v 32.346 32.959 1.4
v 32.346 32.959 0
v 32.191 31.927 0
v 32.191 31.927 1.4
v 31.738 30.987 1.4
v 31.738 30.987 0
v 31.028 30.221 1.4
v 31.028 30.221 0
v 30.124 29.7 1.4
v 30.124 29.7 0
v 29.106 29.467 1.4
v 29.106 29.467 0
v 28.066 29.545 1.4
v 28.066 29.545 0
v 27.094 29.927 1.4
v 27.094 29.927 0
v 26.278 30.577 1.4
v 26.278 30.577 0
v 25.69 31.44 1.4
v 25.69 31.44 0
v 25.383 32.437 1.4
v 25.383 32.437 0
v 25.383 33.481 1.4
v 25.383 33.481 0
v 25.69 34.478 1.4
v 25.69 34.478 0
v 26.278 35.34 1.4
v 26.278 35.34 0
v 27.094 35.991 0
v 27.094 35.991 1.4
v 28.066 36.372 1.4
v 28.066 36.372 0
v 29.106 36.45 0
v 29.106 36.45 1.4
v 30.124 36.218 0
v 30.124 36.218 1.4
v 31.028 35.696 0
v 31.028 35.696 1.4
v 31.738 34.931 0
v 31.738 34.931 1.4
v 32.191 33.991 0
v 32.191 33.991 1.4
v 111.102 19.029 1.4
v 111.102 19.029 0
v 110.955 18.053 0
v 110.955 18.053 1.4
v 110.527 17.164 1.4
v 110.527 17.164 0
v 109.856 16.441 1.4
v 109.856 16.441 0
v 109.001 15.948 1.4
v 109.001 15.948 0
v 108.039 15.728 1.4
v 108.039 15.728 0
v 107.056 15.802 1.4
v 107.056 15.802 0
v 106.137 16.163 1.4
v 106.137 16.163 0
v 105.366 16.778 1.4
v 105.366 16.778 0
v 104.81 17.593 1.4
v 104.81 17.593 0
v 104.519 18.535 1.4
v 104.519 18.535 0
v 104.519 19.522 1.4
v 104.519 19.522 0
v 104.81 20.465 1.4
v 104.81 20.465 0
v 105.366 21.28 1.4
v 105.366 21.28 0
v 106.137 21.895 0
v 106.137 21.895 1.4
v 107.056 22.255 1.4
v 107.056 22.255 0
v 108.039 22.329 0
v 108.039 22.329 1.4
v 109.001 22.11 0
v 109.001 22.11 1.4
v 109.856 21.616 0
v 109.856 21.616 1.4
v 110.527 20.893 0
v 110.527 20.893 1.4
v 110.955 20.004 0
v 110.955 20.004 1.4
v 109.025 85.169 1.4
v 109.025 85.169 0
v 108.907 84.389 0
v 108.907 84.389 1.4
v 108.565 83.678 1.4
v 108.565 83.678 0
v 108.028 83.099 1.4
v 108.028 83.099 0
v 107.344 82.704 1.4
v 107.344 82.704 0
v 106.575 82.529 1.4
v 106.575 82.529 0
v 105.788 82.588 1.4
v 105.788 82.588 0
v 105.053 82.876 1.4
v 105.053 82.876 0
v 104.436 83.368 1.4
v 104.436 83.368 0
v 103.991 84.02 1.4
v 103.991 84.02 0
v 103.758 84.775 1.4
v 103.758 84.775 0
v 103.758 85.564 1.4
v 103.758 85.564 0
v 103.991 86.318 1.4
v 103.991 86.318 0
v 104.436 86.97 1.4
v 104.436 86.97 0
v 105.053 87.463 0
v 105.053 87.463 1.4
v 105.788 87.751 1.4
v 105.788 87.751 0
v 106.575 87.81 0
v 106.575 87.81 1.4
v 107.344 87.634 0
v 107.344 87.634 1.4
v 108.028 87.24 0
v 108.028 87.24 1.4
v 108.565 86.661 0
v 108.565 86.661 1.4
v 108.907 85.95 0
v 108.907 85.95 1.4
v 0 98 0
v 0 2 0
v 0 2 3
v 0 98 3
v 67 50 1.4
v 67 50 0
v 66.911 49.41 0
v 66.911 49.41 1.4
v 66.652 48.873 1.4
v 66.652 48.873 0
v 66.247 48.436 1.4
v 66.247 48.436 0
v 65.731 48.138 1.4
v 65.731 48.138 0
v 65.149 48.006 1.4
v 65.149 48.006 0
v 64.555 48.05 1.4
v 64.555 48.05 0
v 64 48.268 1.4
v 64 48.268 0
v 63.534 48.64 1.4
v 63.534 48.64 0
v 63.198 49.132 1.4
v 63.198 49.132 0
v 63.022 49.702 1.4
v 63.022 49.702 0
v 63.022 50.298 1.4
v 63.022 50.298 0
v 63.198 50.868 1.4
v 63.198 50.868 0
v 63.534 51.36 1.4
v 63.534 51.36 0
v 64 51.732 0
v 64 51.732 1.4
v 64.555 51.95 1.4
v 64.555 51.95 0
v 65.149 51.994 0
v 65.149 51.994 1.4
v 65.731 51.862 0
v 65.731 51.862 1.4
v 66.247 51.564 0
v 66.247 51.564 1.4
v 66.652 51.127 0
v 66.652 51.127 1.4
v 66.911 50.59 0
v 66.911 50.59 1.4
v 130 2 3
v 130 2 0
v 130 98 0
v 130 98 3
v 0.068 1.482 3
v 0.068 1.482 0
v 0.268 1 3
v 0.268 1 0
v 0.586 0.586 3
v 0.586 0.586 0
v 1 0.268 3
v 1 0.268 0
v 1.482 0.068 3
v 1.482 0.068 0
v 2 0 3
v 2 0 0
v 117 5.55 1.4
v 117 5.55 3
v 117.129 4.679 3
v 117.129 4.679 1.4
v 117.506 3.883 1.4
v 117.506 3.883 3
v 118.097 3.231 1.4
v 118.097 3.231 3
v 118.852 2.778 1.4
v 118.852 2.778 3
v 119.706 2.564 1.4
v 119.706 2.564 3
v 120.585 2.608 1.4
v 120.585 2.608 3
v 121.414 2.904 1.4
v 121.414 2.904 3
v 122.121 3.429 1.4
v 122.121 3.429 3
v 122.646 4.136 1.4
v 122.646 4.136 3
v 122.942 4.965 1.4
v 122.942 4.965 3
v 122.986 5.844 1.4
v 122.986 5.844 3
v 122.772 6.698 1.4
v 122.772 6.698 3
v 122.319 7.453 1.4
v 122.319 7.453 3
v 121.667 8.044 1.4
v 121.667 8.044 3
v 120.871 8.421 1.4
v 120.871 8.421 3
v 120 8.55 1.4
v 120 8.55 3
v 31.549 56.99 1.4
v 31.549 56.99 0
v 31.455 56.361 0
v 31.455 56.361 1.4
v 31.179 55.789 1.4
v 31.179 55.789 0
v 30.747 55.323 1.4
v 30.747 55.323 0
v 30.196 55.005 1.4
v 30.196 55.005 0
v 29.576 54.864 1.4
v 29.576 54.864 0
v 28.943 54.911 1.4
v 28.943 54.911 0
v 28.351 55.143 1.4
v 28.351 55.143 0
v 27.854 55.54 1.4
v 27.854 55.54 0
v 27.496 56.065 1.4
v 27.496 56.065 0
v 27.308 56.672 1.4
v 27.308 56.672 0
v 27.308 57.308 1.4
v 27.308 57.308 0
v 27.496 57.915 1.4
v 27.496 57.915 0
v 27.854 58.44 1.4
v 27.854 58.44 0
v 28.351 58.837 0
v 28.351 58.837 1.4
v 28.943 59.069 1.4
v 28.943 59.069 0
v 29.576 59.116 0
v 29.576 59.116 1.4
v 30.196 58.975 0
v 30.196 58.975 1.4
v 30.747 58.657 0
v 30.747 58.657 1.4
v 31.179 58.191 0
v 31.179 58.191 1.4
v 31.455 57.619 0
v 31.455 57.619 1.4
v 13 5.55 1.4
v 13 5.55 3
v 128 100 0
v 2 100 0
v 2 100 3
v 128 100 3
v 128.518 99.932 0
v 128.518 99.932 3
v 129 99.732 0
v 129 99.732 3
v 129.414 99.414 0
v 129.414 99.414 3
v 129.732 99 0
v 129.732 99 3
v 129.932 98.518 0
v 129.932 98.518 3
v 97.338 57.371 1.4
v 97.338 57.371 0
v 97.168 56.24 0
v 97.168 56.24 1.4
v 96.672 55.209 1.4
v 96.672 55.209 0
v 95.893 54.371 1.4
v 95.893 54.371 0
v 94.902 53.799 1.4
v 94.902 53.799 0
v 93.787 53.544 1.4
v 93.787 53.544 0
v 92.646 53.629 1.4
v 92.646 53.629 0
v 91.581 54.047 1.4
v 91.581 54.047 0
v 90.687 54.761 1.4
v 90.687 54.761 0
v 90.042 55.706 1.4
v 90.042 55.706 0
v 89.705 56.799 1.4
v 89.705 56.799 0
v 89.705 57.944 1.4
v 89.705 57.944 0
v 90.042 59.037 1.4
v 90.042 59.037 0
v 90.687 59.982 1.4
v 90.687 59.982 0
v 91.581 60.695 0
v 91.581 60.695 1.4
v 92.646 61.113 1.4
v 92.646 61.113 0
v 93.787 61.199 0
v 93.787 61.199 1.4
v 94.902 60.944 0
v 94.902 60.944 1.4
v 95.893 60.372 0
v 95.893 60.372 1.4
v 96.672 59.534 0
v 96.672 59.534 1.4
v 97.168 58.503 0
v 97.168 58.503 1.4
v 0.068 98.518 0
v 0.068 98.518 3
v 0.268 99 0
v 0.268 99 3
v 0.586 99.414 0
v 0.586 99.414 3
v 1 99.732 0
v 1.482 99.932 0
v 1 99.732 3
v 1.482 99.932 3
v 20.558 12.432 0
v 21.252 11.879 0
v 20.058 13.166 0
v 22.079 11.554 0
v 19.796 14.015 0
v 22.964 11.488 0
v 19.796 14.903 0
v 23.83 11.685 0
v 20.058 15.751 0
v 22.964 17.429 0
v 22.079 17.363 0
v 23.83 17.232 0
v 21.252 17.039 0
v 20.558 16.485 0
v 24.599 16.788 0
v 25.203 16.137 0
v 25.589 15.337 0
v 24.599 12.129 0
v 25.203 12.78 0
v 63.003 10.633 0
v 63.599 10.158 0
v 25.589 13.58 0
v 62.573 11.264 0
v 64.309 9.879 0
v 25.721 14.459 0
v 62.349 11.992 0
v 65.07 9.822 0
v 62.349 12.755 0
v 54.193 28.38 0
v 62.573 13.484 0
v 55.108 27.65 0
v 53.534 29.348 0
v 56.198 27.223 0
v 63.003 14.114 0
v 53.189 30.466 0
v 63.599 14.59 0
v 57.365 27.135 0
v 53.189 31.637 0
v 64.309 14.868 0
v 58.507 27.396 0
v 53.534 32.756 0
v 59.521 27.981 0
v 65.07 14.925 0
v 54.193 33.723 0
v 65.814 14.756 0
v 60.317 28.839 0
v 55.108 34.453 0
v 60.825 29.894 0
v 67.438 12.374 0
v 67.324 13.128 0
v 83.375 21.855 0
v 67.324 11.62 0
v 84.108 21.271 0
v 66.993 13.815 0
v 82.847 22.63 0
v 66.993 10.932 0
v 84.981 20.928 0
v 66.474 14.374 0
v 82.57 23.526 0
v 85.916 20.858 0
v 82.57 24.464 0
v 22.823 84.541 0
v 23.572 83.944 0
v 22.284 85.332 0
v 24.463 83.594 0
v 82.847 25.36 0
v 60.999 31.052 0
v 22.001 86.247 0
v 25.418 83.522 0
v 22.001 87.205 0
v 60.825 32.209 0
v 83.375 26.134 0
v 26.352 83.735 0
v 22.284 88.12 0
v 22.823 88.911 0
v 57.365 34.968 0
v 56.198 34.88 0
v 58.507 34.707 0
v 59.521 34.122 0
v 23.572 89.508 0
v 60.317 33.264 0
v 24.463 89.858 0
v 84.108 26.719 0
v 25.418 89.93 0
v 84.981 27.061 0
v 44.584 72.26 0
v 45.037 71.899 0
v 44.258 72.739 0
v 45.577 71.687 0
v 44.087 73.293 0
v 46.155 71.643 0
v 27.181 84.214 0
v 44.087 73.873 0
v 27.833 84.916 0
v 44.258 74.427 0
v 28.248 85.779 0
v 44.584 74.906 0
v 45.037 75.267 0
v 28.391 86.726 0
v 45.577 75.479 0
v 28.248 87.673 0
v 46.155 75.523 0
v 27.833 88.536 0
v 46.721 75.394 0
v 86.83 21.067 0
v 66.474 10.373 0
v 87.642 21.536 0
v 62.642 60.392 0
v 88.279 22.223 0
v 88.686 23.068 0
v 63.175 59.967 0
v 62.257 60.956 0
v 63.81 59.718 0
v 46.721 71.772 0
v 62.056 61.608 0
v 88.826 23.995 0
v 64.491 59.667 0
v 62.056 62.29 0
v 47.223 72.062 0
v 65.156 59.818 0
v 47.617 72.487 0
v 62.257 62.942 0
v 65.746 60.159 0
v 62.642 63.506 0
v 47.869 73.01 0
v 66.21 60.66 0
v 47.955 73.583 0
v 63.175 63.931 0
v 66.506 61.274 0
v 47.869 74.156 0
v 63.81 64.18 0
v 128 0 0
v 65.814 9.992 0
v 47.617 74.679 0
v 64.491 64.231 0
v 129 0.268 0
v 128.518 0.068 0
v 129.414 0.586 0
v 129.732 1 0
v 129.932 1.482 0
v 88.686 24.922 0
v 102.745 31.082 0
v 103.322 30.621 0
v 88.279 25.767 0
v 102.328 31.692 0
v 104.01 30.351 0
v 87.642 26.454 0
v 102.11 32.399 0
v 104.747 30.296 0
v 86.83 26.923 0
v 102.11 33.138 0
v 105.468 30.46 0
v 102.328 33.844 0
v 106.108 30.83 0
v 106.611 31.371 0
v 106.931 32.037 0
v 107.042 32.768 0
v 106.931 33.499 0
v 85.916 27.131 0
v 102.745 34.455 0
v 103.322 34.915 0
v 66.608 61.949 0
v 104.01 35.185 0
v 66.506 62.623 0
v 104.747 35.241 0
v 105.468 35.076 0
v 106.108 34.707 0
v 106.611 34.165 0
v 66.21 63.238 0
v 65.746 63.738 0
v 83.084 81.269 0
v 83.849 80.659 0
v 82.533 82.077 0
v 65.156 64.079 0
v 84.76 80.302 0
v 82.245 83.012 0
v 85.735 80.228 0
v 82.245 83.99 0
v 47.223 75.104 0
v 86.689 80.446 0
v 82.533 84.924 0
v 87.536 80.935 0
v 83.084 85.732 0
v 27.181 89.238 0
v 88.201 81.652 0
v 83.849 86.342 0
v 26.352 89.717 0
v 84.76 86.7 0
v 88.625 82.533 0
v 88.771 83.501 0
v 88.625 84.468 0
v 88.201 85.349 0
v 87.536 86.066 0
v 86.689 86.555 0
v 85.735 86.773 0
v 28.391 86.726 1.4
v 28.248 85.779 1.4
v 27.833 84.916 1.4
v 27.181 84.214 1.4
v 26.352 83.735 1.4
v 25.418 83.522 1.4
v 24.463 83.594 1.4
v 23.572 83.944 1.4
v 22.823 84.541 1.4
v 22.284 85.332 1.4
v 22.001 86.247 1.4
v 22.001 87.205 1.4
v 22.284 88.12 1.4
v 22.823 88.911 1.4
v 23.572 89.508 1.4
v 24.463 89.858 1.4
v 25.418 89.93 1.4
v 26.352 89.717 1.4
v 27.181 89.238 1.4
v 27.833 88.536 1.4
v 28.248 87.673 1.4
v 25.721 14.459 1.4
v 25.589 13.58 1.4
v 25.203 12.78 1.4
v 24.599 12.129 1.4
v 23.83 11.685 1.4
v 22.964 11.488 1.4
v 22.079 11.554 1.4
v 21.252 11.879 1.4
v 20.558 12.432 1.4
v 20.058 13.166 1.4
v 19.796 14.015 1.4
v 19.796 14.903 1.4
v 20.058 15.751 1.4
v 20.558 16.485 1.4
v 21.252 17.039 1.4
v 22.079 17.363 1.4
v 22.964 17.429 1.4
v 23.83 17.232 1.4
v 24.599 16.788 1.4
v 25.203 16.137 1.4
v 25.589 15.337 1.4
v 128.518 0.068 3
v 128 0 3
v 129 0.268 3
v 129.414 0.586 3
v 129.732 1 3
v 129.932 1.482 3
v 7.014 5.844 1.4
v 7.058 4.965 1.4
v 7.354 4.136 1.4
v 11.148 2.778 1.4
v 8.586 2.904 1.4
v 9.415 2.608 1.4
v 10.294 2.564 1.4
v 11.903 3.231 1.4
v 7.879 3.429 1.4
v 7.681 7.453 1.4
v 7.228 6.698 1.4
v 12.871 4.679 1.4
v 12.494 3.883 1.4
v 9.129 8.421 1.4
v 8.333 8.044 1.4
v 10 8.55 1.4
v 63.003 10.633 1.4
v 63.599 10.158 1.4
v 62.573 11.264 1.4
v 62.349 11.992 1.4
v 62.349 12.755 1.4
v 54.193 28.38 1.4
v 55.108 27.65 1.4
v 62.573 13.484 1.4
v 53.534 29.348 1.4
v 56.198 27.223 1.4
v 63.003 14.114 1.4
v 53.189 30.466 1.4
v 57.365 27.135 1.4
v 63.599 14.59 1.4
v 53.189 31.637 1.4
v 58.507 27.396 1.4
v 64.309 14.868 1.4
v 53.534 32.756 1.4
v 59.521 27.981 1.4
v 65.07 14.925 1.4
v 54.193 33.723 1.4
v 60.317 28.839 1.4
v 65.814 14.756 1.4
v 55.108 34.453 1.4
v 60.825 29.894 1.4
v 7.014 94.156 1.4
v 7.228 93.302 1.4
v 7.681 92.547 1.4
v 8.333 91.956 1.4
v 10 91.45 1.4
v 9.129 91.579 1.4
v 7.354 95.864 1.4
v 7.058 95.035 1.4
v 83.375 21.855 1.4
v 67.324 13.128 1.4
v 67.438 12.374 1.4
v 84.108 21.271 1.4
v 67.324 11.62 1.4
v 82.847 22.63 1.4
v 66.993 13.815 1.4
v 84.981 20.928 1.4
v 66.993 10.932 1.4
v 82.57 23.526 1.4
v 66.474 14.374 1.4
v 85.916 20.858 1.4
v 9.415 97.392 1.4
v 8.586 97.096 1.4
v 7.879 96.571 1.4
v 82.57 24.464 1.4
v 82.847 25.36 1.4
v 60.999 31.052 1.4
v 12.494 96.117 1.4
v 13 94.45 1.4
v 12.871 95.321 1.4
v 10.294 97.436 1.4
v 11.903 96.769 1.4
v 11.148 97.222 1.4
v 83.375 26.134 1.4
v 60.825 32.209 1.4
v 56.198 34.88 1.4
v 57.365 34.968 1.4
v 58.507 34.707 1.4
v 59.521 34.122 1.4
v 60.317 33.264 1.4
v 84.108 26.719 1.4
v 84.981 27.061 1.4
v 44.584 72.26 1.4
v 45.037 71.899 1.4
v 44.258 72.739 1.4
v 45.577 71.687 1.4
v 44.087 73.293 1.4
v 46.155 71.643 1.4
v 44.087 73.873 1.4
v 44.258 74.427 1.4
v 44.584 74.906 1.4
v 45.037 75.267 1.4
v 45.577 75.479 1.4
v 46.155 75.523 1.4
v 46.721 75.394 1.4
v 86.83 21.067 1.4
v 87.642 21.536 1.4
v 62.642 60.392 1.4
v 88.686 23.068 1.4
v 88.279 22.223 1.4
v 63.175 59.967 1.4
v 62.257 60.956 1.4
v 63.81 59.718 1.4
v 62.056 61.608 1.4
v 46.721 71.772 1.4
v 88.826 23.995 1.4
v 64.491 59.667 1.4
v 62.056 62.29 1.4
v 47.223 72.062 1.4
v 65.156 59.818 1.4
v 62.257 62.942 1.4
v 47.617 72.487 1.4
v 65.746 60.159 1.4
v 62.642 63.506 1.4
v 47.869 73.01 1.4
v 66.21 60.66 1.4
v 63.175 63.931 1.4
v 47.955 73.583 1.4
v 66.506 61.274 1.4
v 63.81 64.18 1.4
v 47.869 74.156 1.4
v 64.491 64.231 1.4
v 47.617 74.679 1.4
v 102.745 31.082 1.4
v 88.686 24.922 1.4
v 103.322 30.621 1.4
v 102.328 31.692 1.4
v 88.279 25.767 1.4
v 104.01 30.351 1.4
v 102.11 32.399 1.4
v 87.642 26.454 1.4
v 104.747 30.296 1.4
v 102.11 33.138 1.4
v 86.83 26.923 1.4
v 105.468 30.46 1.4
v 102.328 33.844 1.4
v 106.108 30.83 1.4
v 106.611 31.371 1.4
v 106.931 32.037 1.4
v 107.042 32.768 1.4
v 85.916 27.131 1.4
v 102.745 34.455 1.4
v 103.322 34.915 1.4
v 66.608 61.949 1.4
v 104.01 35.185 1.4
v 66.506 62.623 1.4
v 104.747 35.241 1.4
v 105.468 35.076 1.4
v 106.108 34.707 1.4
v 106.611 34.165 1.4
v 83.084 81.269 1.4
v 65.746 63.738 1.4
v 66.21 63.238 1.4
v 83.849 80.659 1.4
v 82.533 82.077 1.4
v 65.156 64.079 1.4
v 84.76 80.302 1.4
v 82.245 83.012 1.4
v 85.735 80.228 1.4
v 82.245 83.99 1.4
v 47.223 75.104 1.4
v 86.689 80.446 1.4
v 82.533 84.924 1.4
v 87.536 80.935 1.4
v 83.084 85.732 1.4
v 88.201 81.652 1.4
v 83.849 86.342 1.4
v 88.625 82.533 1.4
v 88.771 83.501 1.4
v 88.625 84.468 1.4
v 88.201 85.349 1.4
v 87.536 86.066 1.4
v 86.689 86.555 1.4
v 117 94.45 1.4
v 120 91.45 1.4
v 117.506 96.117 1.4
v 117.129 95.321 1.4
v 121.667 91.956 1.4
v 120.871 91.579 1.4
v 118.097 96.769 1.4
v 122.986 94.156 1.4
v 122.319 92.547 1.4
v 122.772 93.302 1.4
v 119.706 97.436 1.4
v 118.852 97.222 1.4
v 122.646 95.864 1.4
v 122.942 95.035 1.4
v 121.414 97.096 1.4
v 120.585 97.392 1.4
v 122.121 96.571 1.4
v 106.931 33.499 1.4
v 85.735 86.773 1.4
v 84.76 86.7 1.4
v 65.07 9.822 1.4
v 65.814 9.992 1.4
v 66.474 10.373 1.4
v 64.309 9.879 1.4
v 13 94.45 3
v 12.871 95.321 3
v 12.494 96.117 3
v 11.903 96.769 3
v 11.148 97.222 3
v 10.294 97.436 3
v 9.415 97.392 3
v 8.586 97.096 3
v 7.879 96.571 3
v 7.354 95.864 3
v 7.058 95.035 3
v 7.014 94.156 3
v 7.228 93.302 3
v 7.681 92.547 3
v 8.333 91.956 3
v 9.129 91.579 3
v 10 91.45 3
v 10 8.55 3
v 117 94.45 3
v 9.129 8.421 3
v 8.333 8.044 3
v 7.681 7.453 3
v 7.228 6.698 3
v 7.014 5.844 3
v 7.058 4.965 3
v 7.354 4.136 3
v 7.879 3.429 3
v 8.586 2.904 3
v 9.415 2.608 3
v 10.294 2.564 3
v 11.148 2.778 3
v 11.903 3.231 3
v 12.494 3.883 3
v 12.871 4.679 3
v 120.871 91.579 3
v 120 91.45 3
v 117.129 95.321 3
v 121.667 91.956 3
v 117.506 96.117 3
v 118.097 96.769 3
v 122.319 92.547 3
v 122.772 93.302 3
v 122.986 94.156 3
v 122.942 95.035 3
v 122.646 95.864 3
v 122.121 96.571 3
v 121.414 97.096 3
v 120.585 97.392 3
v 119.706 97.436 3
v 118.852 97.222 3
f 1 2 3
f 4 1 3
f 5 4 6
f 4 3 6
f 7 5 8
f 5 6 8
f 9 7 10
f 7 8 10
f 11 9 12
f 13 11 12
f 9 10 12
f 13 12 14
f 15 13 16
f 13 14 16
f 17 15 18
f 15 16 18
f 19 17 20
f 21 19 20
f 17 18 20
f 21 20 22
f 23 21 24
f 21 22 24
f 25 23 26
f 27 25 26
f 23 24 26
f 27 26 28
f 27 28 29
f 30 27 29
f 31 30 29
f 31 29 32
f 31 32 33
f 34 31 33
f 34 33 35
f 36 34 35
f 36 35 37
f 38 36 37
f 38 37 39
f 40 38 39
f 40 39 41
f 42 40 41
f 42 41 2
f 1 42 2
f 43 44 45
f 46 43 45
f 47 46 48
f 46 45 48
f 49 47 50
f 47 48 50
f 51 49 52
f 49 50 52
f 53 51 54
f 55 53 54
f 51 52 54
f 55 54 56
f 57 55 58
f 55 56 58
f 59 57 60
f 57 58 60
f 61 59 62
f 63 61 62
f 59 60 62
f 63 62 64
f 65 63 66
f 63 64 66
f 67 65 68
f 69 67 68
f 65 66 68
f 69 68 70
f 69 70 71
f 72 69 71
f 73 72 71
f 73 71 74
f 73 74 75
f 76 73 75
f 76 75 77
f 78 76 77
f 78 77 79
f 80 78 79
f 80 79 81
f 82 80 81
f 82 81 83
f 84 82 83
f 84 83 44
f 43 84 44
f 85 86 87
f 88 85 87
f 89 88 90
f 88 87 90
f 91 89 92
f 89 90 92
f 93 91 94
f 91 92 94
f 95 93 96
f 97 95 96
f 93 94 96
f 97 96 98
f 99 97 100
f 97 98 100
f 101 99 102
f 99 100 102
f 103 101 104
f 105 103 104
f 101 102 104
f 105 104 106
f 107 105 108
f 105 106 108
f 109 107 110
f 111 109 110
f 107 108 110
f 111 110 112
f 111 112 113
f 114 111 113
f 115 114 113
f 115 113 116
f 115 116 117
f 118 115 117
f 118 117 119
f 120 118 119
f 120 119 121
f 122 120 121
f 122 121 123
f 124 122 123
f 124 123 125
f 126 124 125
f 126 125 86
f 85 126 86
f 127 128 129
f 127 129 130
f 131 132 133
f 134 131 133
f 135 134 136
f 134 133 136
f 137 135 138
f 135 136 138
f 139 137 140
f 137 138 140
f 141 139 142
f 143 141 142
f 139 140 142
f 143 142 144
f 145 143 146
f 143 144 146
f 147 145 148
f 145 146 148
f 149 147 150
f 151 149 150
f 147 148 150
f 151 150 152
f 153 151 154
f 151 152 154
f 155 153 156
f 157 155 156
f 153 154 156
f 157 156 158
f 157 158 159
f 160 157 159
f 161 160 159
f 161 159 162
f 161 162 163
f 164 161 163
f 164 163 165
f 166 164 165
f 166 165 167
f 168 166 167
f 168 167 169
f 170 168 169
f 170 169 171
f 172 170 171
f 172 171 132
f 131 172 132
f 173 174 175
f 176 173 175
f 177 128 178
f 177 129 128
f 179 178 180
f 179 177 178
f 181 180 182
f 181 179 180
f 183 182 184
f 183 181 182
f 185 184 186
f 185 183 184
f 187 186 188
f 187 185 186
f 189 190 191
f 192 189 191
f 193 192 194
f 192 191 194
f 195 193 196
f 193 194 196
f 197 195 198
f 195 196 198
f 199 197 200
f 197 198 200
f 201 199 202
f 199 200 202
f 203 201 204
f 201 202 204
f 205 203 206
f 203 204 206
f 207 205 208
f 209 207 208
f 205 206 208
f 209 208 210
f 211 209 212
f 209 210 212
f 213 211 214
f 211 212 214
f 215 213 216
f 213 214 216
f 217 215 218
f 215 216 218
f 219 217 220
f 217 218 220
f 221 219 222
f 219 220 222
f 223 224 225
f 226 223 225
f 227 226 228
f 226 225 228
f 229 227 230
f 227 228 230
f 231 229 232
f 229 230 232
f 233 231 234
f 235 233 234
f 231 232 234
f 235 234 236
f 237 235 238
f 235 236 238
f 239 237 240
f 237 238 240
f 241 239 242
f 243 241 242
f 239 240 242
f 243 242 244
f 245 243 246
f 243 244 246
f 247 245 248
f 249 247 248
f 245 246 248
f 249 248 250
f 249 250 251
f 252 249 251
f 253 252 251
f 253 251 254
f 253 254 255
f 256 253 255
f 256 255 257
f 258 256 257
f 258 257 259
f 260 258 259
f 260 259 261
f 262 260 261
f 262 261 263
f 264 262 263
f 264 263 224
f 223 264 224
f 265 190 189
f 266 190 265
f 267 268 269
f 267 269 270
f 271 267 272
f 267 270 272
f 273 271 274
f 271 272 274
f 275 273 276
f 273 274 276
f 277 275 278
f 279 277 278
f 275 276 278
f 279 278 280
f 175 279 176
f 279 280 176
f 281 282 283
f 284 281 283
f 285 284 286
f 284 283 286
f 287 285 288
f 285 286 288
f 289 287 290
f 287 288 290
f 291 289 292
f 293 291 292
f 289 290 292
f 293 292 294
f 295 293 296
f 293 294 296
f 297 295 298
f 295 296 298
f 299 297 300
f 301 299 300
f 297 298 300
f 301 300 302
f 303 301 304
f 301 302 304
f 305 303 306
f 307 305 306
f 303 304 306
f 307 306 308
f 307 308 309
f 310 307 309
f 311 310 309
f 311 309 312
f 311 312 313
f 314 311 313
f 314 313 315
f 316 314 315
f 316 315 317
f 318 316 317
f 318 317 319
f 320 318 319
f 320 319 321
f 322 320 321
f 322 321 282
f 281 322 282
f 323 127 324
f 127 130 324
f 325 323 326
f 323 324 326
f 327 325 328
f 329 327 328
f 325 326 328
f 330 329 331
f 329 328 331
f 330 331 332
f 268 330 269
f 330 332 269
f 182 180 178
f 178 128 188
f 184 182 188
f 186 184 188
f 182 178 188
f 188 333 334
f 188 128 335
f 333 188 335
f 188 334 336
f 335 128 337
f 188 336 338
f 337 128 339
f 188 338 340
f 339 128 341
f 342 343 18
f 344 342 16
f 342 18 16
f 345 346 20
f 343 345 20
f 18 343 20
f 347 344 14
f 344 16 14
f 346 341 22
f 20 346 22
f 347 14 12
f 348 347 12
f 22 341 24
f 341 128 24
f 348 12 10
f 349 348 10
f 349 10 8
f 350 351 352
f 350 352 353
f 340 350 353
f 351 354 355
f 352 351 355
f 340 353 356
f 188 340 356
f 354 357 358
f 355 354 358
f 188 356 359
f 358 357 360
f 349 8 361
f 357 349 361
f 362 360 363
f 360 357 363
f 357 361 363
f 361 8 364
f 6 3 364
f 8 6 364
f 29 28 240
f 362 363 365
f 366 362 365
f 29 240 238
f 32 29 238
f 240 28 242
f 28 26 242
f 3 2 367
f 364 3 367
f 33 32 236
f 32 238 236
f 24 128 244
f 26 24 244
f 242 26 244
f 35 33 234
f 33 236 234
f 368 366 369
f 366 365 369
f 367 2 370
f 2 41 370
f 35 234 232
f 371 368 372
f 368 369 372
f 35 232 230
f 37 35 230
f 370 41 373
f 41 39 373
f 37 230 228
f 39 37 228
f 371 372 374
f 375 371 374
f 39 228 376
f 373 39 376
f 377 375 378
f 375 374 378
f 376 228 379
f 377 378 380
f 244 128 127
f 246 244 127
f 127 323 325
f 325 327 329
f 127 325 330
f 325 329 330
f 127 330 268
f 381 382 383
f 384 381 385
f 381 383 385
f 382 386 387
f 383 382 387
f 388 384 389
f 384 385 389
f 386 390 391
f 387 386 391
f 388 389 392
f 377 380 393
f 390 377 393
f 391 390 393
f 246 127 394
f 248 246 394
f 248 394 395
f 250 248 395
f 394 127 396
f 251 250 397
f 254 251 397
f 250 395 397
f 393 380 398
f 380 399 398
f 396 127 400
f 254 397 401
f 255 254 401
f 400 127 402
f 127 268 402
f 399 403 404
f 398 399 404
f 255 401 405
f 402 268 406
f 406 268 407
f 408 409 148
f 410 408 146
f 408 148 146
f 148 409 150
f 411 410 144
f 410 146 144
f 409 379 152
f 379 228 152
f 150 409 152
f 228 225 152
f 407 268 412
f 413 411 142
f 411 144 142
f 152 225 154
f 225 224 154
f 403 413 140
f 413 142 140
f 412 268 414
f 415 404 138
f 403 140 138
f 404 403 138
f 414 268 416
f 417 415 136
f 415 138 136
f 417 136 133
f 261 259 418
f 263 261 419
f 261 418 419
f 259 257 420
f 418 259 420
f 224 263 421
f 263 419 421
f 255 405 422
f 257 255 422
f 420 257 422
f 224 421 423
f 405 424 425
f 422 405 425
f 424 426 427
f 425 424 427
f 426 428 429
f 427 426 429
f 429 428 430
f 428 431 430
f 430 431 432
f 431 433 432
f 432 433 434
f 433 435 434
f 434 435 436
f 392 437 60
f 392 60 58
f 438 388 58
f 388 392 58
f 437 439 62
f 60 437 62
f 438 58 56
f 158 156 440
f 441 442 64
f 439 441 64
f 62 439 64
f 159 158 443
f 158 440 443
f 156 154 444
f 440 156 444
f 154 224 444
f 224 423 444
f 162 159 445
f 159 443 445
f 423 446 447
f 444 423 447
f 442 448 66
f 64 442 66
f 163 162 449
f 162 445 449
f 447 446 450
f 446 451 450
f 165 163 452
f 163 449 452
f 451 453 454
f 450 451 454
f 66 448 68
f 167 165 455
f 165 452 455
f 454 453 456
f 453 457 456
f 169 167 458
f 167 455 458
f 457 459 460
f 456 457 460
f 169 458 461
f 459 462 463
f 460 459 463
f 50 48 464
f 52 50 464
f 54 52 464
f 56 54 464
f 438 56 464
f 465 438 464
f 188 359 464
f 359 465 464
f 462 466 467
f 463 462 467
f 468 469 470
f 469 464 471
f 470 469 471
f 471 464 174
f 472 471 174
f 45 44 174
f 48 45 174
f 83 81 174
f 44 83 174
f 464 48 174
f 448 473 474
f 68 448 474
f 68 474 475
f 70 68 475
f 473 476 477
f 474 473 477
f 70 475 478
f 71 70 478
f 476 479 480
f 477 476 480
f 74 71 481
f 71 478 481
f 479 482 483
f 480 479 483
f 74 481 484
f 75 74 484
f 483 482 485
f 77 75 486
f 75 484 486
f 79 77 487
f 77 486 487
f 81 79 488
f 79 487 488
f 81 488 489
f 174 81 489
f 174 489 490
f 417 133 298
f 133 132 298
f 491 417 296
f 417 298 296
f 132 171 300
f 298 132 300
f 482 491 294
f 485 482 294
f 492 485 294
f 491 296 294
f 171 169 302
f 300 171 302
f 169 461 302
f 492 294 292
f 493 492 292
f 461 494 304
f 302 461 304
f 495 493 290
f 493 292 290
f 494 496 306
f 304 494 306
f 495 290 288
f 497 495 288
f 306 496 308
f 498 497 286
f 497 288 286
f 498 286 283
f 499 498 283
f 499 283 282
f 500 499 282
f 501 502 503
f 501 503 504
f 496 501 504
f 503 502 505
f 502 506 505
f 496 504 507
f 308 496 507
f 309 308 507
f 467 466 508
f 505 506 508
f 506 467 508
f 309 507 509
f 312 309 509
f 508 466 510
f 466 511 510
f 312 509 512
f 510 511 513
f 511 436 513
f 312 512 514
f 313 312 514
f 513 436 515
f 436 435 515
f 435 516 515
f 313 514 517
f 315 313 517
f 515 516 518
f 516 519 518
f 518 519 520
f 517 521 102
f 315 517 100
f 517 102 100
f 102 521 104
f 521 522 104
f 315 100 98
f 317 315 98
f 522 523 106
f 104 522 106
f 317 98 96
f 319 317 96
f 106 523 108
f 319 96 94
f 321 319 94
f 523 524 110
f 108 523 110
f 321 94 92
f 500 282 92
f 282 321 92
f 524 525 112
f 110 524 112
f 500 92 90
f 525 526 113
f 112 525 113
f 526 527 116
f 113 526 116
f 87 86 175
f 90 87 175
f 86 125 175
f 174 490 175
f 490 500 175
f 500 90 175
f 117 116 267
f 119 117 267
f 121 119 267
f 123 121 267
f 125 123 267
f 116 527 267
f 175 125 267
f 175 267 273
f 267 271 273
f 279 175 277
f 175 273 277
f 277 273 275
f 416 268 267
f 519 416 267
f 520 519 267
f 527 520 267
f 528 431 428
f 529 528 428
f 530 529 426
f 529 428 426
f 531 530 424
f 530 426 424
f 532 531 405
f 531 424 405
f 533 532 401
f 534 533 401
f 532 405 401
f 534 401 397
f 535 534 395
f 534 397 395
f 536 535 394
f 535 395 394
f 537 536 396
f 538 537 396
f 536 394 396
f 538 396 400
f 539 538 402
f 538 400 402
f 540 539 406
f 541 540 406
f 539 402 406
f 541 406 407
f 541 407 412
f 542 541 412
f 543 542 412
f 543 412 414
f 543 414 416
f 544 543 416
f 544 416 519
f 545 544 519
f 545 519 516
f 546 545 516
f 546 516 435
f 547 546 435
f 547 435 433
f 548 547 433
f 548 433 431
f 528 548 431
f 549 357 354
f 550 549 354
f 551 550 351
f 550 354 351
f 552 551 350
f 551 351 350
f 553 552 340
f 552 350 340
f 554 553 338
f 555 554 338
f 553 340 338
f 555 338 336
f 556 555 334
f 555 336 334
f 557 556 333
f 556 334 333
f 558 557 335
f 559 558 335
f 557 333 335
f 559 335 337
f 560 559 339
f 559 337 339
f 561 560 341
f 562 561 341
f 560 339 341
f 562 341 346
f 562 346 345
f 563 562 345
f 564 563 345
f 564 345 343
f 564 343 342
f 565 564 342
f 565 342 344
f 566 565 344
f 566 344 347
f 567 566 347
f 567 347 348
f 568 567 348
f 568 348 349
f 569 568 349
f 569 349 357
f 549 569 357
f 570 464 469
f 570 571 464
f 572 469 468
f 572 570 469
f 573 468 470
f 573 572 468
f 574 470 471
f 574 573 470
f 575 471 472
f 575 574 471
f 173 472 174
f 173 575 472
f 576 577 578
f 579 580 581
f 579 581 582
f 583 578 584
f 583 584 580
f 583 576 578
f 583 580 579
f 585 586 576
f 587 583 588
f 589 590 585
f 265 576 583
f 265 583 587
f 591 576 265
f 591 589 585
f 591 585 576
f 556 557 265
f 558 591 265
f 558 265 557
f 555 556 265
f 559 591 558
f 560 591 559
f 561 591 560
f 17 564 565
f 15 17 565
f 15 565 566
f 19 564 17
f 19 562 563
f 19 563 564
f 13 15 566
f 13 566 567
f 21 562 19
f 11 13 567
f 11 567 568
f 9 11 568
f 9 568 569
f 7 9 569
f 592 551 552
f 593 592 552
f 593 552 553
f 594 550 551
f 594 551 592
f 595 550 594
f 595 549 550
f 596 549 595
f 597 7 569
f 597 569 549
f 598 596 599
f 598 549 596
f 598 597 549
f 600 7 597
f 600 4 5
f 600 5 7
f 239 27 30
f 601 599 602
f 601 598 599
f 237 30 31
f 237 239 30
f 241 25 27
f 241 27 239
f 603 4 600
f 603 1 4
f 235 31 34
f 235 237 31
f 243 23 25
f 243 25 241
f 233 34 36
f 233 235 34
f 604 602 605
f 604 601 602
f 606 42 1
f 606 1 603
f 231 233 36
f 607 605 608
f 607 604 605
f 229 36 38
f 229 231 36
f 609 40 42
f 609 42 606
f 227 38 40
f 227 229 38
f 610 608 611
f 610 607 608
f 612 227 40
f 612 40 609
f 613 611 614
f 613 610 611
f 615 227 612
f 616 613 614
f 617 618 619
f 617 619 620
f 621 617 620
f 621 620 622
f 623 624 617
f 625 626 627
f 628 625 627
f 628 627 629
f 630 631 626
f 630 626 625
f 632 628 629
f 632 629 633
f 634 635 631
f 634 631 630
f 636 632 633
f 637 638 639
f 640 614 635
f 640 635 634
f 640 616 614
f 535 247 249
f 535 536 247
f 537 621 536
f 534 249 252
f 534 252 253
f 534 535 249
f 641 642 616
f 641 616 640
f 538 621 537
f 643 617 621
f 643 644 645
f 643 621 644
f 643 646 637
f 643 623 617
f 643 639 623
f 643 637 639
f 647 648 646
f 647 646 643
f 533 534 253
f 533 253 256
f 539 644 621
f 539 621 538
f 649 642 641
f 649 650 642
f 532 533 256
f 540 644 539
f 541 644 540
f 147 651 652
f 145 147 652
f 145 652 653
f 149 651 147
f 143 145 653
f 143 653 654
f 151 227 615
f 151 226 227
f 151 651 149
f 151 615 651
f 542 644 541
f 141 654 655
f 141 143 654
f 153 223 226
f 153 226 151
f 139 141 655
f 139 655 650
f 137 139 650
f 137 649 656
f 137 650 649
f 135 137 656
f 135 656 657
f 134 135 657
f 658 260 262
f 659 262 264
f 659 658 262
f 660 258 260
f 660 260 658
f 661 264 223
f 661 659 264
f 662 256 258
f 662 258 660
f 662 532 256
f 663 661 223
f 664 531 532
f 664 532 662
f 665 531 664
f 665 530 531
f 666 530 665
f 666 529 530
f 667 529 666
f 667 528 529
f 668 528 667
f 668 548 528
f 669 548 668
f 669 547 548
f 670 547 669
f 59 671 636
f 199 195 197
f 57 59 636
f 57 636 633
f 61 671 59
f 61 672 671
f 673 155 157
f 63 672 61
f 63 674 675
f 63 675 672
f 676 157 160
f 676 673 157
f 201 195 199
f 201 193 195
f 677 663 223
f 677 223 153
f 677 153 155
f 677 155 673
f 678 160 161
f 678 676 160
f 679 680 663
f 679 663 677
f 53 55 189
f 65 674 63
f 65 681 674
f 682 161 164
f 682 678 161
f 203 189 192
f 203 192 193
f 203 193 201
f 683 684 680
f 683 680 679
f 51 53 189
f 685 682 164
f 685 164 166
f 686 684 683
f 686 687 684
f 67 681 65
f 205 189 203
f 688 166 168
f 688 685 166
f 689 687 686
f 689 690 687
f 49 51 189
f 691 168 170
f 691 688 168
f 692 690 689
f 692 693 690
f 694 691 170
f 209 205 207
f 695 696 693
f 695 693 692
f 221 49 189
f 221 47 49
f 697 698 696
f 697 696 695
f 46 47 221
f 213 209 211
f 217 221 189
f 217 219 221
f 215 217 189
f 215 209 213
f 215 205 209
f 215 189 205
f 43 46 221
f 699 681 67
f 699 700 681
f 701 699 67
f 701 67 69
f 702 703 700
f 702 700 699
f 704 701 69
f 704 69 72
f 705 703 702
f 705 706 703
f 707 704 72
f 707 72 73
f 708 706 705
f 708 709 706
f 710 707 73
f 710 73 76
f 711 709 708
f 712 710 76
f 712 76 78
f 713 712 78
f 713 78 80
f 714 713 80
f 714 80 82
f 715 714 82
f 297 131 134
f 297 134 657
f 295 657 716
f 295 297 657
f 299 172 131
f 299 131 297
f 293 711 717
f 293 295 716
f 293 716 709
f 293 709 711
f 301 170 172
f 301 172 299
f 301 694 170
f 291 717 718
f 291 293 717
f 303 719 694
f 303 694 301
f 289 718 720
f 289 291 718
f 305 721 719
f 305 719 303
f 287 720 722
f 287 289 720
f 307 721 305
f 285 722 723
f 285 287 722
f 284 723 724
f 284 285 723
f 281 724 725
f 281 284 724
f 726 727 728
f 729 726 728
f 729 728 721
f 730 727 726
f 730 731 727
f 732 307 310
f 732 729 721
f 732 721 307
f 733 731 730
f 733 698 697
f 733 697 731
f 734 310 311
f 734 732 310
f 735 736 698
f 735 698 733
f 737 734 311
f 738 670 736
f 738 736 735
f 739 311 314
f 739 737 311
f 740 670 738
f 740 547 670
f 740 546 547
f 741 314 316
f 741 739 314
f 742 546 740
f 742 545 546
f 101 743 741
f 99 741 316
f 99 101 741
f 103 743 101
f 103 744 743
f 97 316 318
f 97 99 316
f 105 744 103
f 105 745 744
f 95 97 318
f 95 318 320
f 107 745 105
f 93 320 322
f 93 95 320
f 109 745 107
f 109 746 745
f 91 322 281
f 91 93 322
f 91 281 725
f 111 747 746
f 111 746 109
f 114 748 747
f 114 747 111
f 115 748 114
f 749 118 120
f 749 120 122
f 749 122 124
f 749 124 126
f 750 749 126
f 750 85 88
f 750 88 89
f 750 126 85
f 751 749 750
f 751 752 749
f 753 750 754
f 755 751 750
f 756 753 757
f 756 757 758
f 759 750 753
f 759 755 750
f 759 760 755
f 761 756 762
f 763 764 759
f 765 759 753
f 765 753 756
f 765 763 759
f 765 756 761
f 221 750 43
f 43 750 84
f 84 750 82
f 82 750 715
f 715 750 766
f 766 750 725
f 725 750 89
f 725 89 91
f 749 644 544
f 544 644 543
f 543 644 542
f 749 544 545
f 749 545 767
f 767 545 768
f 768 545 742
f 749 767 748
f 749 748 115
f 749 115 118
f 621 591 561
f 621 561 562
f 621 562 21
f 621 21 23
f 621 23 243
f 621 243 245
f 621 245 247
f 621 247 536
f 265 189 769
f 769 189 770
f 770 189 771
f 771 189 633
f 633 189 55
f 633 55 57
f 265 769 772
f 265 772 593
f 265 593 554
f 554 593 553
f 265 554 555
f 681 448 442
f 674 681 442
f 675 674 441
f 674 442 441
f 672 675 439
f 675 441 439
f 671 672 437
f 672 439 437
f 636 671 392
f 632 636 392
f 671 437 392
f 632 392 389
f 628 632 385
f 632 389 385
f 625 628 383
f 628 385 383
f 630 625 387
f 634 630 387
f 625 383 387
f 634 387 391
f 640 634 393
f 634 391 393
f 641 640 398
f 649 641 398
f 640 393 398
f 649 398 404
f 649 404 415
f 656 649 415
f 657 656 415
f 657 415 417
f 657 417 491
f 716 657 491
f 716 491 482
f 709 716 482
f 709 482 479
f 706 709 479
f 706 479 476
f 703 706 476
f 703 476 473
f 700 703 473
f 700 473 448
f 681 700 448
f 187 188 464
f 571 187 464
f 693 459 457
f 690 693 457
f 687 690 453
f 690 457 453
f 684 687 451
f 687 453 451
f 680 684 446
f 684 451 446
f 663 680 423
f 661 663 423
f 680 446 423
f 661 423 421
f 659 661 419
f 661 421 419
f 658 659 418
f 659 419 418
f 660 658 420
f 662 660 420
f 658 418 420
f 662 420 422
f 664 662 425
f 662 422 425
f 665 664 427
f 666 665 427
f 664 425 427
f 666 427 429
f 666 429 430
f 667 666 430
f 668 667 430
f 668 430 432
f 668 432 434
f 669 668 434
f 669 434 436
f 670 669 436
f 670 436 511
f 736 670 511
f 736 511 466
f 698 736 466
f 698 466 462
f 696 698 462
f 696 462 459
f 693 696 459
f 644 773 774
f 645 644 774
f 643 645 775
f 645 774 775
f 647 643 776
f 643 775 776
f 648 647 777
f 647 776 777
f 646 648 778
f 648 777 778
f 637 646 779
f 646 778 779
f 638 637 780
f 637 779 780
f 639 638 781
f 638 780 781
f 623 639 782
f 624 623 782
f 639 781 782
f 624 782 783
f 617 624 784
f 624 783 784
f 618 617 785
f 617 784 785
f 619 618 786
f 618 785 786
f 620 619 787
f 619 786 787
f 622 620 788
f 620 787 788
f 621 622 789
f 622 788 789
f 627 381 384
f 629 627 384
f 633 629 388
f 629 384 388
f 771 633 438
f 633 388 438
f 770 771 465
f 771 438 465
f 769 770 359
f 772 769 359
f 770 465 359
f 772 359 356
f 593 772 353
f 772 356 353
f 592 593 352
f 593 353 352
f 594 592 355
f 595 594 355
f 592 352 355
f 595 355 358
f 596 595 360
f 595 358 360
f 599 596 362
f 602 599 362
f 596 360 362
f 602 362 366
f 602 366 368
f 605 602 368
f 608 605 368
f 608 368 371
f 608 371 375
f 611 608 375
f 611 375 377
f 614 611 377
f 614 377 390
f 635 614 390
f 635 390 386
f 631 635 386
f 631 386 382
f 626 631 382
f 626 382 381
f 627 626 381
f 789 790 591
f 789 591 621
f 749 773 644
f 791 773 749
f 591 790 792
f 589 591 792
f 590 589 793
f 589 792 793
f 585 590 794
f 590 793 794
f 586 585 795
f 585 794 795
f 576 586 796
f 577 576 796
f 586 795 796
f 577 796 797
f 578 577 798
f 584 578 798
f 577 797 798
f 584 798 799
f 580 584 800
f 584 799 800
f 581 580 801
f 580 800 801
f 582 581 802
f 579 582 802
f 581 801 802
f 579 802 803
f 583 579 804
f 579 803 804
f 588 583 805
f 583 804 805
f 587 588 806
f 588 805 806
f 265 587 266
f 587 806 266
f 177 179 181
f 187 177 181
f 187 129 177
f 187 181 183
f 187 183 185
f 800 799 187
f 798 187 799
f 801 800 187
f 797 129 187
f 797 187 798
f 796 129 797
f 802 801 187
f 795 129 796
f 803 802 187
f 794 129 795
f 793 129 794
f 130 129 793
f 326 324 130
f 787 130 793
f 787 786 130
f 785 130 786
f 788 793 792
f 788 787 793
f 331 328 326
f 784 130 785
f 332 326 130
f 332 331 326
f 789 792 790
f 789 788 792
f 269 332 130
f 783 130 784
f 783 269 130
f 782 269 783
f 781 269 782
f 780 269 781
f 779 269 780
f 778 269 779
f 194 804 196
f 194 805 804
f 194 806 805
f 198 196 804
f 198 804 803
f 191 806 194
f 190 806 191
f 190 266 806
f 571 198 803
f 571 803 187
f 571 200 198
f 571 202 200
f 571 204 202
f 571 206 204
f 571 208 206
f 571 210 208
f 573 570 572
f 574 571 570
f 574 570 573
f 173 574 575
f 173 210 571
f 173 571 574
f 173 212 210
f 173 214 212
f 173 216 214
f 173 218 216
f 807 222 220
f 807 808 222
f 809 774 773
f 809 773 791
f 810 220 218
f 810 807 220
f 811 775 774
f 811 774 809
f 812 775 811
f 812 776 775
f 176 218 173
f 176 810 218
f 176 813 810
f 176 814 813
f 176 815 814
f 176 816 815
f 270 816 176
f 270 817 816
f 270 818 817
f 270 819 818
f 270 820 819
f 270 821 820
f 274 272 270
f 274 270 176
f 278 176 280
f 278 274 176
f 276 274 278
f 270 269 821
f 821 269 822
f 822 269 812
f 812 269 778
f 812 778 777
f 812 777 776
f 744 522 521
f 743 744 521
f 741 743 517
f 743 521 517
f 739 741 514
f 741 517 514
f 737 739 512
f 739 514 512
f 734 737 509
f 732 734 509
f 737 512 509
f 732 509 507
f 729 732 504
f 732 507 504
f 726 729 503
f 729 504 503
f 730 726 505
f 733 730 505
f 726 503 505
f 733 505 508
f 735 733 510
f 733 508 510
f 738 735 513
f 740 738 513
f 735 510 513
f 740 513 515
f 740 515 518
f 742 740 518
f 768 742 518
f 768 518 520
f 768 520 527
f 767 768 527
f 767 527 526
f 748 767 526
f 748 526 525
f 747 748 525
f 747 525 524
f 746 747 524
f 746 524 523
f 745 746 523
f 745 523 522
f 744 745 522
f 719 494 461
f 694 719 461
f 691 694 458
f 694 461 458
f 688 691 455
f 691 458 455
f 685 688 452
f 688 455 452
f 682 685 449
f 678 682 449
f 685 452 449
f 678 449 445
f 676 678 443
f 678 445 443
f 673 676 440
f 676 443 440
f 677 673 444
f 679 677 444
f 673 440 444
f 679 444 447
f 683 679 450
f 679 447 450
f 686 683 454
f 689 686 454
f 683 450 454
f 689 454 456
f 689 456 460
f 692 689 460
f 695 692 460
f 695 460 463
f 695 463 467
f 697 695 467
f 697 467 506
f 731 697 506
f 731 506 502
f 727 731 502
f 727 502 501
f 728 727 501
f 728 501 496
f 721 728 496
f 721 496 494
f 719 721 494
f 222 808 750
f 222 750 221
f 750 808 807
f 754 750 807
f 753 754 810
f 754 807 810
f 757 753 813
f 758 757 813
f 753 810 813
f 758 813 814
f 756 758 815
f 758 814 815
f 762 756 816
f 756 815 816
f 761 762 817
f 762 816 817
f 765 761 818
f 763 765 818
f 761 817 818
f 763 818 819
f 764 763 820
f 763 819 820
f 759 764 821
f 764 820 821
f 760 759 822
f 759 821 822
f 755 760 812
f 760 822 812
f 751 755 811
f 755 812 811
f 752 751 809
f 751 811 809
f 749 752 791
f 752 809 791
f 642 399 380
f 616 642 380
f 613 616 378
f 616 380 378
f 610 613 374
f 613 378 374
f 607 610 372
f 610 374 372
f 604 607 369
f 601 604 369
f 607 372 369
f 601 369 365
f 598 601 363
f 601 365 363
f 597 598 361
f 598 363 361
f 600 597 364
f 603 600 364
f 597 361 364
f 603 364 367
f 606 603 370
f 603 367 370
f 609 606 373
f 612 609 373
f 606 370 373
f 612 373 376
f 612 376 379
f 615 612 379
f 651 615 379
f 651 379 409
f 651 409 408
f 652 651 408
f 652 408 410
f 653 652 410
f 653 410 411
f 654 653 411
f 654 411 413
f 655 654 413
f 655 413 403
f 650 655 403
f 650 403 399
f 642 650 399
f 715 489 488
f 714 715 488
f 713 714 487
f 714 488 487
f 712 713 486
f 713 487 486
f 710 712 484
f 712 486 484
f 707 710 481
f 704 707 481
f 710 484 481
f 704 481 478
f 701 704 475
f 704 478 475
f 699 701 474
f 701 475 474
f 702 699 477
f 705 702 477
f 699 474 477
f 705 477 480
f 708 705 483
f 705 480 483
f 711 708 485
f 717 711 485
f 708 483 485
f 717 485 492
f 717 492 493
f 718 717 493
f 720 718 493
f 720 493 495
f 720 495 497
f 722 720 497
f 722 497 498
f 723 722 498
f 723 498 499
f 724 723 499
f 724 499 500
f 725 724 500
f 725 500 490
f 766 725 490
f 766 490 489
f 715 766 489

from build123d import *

# Parameters (mm, degrees)
SKETCH_W        = 130
SKETCH_H        = 100
PAD_DEPTH       = 3
POCKET_DEPTH    = 1.6
SKETCH002_R     = 2
SKETCH002_R_2   = 3.501224
SKETCH002_R_3   = 3.145499
SKETCH002_R_4   = 3.838243
SKETCH002_R_5   = 3.281325
SKETCH002_R_6   = 2.288685
SKETCH002_R_7   = 1.945006
SKETCH002_R_8   = 2.13236
SKETCH002_R_9   = 3.927242
SKETCH002_R_10  = 2.558827
SKETCH002_R_11  = 2.9792
SKETCH002_R_12  = 2.479414
SKETCH002_R_13  = 2.648073
SKETCH002_R_14  = 3.212751
SKETCH002_R_15  = 3.309638
POCKET001_DEPTH = 3.001
FILLET_R        = 2


with BuildPart() as part:
    # Sketch → Pad (new body)
    with BuildSketch(Plane.XY):
        with Locations((65, 50)):
            Rectangle(SKETCH_W, SKETCH_H)
    extrude(amount=PAD_DEPTH)

    # Sketch001 (on Face6 of Pad) → Pocket (cut)
    with BuildSketch(Plane.XY.offset(3)):
        with BuildLine():
            ThreePointArc((117, 5.55), (122.12132, 3.42868), (120, 8.55))
            Line((120, 91.45), (120, 8.55))
            ThreePointArc((120, 91.45), (122.12132, 96.57132), (117, 94.45))
            Line((13, 94.45), (117, 94.45))
            ThreePointArc((13, 94.45), (7.87868, 96.57132), (10, 91.45))
            Line((10, 8.55), (10, 91.45))
            ThreePointArc((10, 8.55), (7.87868, 3.42868), (13, 5.55))
            Line((117, 5.55), (13, 5.55))
        make_face()
    extrude(amount=-POCKET_DEPTH, mode=Mode.SUBTRACT)

    # Sketch002 (on Face4 of Pocket) → Pocket001 (cut, through all)
    with BuildSketch(Plane(origin=(0, 0, 0), x_dir=(1, 0, 0), z_dir=(0, 0, -1))):
        with Locations((65, -50)):
            Circle(SKETCH002_R)
        with Locations((28.844851, -32.958813)):
            Circle(SKETCH002_R_2)
        with Locations((85.680542, -23.994795)):
            Circle(SKETCH002_R_3)
        with Locations((93.500214, -57.371456)):
            Circle(SKETCH002_R_4)
        with Locations((85.489815, -83.50061)):
            Circle(SKETCH002_R_5)
        with Locations((64.319481, -61.948826)):
            Circle(SKETCH002_R_6)
        with Locations((46.009991, -73.582977)):
            Circle(SKETCH002_R_7)
        with Locations((29.417021, -56.990009)):
            Circle(SKETCH002_R_8)
        with Locations((57.071968, -31.051573)):
            Circle(SKETCH002_R_9)
        with Locations((64.878792, -12.373779)):
            Circle(SKETCH002_R_10)
        with Locations((22.74169, -14.45861)):
            Circle(SKETCH002_R_11)
        with Locations((104.56218, -32.768085)):
            Circle(SKETCH002_R_12)
        with Locations((106.376934, -85.169306)):
            Circle(SKETCH002_R_13)
        with Locations((25.178326, -86.726067)):
            Circle(SKETCH002_R_14)
        with Locations((107.791985, -19.028767)):
            Circle(SKETCH002_R_15)
    extrude(amount=-POCKET001_DEPTH, mode=Mode.SUBTRACT)

    # Fillet
    fillet_edges = [part.edges().sort_by_distance(p)[0] for p in [
        (130, 0, 1.5),
        (0, 0, 1.5),
        (130, 100, 1.5),
        (0, 100, 1.5),
    ]]
    fillet(fillet_edges, radius=FILLET_R)


solid = part.part
